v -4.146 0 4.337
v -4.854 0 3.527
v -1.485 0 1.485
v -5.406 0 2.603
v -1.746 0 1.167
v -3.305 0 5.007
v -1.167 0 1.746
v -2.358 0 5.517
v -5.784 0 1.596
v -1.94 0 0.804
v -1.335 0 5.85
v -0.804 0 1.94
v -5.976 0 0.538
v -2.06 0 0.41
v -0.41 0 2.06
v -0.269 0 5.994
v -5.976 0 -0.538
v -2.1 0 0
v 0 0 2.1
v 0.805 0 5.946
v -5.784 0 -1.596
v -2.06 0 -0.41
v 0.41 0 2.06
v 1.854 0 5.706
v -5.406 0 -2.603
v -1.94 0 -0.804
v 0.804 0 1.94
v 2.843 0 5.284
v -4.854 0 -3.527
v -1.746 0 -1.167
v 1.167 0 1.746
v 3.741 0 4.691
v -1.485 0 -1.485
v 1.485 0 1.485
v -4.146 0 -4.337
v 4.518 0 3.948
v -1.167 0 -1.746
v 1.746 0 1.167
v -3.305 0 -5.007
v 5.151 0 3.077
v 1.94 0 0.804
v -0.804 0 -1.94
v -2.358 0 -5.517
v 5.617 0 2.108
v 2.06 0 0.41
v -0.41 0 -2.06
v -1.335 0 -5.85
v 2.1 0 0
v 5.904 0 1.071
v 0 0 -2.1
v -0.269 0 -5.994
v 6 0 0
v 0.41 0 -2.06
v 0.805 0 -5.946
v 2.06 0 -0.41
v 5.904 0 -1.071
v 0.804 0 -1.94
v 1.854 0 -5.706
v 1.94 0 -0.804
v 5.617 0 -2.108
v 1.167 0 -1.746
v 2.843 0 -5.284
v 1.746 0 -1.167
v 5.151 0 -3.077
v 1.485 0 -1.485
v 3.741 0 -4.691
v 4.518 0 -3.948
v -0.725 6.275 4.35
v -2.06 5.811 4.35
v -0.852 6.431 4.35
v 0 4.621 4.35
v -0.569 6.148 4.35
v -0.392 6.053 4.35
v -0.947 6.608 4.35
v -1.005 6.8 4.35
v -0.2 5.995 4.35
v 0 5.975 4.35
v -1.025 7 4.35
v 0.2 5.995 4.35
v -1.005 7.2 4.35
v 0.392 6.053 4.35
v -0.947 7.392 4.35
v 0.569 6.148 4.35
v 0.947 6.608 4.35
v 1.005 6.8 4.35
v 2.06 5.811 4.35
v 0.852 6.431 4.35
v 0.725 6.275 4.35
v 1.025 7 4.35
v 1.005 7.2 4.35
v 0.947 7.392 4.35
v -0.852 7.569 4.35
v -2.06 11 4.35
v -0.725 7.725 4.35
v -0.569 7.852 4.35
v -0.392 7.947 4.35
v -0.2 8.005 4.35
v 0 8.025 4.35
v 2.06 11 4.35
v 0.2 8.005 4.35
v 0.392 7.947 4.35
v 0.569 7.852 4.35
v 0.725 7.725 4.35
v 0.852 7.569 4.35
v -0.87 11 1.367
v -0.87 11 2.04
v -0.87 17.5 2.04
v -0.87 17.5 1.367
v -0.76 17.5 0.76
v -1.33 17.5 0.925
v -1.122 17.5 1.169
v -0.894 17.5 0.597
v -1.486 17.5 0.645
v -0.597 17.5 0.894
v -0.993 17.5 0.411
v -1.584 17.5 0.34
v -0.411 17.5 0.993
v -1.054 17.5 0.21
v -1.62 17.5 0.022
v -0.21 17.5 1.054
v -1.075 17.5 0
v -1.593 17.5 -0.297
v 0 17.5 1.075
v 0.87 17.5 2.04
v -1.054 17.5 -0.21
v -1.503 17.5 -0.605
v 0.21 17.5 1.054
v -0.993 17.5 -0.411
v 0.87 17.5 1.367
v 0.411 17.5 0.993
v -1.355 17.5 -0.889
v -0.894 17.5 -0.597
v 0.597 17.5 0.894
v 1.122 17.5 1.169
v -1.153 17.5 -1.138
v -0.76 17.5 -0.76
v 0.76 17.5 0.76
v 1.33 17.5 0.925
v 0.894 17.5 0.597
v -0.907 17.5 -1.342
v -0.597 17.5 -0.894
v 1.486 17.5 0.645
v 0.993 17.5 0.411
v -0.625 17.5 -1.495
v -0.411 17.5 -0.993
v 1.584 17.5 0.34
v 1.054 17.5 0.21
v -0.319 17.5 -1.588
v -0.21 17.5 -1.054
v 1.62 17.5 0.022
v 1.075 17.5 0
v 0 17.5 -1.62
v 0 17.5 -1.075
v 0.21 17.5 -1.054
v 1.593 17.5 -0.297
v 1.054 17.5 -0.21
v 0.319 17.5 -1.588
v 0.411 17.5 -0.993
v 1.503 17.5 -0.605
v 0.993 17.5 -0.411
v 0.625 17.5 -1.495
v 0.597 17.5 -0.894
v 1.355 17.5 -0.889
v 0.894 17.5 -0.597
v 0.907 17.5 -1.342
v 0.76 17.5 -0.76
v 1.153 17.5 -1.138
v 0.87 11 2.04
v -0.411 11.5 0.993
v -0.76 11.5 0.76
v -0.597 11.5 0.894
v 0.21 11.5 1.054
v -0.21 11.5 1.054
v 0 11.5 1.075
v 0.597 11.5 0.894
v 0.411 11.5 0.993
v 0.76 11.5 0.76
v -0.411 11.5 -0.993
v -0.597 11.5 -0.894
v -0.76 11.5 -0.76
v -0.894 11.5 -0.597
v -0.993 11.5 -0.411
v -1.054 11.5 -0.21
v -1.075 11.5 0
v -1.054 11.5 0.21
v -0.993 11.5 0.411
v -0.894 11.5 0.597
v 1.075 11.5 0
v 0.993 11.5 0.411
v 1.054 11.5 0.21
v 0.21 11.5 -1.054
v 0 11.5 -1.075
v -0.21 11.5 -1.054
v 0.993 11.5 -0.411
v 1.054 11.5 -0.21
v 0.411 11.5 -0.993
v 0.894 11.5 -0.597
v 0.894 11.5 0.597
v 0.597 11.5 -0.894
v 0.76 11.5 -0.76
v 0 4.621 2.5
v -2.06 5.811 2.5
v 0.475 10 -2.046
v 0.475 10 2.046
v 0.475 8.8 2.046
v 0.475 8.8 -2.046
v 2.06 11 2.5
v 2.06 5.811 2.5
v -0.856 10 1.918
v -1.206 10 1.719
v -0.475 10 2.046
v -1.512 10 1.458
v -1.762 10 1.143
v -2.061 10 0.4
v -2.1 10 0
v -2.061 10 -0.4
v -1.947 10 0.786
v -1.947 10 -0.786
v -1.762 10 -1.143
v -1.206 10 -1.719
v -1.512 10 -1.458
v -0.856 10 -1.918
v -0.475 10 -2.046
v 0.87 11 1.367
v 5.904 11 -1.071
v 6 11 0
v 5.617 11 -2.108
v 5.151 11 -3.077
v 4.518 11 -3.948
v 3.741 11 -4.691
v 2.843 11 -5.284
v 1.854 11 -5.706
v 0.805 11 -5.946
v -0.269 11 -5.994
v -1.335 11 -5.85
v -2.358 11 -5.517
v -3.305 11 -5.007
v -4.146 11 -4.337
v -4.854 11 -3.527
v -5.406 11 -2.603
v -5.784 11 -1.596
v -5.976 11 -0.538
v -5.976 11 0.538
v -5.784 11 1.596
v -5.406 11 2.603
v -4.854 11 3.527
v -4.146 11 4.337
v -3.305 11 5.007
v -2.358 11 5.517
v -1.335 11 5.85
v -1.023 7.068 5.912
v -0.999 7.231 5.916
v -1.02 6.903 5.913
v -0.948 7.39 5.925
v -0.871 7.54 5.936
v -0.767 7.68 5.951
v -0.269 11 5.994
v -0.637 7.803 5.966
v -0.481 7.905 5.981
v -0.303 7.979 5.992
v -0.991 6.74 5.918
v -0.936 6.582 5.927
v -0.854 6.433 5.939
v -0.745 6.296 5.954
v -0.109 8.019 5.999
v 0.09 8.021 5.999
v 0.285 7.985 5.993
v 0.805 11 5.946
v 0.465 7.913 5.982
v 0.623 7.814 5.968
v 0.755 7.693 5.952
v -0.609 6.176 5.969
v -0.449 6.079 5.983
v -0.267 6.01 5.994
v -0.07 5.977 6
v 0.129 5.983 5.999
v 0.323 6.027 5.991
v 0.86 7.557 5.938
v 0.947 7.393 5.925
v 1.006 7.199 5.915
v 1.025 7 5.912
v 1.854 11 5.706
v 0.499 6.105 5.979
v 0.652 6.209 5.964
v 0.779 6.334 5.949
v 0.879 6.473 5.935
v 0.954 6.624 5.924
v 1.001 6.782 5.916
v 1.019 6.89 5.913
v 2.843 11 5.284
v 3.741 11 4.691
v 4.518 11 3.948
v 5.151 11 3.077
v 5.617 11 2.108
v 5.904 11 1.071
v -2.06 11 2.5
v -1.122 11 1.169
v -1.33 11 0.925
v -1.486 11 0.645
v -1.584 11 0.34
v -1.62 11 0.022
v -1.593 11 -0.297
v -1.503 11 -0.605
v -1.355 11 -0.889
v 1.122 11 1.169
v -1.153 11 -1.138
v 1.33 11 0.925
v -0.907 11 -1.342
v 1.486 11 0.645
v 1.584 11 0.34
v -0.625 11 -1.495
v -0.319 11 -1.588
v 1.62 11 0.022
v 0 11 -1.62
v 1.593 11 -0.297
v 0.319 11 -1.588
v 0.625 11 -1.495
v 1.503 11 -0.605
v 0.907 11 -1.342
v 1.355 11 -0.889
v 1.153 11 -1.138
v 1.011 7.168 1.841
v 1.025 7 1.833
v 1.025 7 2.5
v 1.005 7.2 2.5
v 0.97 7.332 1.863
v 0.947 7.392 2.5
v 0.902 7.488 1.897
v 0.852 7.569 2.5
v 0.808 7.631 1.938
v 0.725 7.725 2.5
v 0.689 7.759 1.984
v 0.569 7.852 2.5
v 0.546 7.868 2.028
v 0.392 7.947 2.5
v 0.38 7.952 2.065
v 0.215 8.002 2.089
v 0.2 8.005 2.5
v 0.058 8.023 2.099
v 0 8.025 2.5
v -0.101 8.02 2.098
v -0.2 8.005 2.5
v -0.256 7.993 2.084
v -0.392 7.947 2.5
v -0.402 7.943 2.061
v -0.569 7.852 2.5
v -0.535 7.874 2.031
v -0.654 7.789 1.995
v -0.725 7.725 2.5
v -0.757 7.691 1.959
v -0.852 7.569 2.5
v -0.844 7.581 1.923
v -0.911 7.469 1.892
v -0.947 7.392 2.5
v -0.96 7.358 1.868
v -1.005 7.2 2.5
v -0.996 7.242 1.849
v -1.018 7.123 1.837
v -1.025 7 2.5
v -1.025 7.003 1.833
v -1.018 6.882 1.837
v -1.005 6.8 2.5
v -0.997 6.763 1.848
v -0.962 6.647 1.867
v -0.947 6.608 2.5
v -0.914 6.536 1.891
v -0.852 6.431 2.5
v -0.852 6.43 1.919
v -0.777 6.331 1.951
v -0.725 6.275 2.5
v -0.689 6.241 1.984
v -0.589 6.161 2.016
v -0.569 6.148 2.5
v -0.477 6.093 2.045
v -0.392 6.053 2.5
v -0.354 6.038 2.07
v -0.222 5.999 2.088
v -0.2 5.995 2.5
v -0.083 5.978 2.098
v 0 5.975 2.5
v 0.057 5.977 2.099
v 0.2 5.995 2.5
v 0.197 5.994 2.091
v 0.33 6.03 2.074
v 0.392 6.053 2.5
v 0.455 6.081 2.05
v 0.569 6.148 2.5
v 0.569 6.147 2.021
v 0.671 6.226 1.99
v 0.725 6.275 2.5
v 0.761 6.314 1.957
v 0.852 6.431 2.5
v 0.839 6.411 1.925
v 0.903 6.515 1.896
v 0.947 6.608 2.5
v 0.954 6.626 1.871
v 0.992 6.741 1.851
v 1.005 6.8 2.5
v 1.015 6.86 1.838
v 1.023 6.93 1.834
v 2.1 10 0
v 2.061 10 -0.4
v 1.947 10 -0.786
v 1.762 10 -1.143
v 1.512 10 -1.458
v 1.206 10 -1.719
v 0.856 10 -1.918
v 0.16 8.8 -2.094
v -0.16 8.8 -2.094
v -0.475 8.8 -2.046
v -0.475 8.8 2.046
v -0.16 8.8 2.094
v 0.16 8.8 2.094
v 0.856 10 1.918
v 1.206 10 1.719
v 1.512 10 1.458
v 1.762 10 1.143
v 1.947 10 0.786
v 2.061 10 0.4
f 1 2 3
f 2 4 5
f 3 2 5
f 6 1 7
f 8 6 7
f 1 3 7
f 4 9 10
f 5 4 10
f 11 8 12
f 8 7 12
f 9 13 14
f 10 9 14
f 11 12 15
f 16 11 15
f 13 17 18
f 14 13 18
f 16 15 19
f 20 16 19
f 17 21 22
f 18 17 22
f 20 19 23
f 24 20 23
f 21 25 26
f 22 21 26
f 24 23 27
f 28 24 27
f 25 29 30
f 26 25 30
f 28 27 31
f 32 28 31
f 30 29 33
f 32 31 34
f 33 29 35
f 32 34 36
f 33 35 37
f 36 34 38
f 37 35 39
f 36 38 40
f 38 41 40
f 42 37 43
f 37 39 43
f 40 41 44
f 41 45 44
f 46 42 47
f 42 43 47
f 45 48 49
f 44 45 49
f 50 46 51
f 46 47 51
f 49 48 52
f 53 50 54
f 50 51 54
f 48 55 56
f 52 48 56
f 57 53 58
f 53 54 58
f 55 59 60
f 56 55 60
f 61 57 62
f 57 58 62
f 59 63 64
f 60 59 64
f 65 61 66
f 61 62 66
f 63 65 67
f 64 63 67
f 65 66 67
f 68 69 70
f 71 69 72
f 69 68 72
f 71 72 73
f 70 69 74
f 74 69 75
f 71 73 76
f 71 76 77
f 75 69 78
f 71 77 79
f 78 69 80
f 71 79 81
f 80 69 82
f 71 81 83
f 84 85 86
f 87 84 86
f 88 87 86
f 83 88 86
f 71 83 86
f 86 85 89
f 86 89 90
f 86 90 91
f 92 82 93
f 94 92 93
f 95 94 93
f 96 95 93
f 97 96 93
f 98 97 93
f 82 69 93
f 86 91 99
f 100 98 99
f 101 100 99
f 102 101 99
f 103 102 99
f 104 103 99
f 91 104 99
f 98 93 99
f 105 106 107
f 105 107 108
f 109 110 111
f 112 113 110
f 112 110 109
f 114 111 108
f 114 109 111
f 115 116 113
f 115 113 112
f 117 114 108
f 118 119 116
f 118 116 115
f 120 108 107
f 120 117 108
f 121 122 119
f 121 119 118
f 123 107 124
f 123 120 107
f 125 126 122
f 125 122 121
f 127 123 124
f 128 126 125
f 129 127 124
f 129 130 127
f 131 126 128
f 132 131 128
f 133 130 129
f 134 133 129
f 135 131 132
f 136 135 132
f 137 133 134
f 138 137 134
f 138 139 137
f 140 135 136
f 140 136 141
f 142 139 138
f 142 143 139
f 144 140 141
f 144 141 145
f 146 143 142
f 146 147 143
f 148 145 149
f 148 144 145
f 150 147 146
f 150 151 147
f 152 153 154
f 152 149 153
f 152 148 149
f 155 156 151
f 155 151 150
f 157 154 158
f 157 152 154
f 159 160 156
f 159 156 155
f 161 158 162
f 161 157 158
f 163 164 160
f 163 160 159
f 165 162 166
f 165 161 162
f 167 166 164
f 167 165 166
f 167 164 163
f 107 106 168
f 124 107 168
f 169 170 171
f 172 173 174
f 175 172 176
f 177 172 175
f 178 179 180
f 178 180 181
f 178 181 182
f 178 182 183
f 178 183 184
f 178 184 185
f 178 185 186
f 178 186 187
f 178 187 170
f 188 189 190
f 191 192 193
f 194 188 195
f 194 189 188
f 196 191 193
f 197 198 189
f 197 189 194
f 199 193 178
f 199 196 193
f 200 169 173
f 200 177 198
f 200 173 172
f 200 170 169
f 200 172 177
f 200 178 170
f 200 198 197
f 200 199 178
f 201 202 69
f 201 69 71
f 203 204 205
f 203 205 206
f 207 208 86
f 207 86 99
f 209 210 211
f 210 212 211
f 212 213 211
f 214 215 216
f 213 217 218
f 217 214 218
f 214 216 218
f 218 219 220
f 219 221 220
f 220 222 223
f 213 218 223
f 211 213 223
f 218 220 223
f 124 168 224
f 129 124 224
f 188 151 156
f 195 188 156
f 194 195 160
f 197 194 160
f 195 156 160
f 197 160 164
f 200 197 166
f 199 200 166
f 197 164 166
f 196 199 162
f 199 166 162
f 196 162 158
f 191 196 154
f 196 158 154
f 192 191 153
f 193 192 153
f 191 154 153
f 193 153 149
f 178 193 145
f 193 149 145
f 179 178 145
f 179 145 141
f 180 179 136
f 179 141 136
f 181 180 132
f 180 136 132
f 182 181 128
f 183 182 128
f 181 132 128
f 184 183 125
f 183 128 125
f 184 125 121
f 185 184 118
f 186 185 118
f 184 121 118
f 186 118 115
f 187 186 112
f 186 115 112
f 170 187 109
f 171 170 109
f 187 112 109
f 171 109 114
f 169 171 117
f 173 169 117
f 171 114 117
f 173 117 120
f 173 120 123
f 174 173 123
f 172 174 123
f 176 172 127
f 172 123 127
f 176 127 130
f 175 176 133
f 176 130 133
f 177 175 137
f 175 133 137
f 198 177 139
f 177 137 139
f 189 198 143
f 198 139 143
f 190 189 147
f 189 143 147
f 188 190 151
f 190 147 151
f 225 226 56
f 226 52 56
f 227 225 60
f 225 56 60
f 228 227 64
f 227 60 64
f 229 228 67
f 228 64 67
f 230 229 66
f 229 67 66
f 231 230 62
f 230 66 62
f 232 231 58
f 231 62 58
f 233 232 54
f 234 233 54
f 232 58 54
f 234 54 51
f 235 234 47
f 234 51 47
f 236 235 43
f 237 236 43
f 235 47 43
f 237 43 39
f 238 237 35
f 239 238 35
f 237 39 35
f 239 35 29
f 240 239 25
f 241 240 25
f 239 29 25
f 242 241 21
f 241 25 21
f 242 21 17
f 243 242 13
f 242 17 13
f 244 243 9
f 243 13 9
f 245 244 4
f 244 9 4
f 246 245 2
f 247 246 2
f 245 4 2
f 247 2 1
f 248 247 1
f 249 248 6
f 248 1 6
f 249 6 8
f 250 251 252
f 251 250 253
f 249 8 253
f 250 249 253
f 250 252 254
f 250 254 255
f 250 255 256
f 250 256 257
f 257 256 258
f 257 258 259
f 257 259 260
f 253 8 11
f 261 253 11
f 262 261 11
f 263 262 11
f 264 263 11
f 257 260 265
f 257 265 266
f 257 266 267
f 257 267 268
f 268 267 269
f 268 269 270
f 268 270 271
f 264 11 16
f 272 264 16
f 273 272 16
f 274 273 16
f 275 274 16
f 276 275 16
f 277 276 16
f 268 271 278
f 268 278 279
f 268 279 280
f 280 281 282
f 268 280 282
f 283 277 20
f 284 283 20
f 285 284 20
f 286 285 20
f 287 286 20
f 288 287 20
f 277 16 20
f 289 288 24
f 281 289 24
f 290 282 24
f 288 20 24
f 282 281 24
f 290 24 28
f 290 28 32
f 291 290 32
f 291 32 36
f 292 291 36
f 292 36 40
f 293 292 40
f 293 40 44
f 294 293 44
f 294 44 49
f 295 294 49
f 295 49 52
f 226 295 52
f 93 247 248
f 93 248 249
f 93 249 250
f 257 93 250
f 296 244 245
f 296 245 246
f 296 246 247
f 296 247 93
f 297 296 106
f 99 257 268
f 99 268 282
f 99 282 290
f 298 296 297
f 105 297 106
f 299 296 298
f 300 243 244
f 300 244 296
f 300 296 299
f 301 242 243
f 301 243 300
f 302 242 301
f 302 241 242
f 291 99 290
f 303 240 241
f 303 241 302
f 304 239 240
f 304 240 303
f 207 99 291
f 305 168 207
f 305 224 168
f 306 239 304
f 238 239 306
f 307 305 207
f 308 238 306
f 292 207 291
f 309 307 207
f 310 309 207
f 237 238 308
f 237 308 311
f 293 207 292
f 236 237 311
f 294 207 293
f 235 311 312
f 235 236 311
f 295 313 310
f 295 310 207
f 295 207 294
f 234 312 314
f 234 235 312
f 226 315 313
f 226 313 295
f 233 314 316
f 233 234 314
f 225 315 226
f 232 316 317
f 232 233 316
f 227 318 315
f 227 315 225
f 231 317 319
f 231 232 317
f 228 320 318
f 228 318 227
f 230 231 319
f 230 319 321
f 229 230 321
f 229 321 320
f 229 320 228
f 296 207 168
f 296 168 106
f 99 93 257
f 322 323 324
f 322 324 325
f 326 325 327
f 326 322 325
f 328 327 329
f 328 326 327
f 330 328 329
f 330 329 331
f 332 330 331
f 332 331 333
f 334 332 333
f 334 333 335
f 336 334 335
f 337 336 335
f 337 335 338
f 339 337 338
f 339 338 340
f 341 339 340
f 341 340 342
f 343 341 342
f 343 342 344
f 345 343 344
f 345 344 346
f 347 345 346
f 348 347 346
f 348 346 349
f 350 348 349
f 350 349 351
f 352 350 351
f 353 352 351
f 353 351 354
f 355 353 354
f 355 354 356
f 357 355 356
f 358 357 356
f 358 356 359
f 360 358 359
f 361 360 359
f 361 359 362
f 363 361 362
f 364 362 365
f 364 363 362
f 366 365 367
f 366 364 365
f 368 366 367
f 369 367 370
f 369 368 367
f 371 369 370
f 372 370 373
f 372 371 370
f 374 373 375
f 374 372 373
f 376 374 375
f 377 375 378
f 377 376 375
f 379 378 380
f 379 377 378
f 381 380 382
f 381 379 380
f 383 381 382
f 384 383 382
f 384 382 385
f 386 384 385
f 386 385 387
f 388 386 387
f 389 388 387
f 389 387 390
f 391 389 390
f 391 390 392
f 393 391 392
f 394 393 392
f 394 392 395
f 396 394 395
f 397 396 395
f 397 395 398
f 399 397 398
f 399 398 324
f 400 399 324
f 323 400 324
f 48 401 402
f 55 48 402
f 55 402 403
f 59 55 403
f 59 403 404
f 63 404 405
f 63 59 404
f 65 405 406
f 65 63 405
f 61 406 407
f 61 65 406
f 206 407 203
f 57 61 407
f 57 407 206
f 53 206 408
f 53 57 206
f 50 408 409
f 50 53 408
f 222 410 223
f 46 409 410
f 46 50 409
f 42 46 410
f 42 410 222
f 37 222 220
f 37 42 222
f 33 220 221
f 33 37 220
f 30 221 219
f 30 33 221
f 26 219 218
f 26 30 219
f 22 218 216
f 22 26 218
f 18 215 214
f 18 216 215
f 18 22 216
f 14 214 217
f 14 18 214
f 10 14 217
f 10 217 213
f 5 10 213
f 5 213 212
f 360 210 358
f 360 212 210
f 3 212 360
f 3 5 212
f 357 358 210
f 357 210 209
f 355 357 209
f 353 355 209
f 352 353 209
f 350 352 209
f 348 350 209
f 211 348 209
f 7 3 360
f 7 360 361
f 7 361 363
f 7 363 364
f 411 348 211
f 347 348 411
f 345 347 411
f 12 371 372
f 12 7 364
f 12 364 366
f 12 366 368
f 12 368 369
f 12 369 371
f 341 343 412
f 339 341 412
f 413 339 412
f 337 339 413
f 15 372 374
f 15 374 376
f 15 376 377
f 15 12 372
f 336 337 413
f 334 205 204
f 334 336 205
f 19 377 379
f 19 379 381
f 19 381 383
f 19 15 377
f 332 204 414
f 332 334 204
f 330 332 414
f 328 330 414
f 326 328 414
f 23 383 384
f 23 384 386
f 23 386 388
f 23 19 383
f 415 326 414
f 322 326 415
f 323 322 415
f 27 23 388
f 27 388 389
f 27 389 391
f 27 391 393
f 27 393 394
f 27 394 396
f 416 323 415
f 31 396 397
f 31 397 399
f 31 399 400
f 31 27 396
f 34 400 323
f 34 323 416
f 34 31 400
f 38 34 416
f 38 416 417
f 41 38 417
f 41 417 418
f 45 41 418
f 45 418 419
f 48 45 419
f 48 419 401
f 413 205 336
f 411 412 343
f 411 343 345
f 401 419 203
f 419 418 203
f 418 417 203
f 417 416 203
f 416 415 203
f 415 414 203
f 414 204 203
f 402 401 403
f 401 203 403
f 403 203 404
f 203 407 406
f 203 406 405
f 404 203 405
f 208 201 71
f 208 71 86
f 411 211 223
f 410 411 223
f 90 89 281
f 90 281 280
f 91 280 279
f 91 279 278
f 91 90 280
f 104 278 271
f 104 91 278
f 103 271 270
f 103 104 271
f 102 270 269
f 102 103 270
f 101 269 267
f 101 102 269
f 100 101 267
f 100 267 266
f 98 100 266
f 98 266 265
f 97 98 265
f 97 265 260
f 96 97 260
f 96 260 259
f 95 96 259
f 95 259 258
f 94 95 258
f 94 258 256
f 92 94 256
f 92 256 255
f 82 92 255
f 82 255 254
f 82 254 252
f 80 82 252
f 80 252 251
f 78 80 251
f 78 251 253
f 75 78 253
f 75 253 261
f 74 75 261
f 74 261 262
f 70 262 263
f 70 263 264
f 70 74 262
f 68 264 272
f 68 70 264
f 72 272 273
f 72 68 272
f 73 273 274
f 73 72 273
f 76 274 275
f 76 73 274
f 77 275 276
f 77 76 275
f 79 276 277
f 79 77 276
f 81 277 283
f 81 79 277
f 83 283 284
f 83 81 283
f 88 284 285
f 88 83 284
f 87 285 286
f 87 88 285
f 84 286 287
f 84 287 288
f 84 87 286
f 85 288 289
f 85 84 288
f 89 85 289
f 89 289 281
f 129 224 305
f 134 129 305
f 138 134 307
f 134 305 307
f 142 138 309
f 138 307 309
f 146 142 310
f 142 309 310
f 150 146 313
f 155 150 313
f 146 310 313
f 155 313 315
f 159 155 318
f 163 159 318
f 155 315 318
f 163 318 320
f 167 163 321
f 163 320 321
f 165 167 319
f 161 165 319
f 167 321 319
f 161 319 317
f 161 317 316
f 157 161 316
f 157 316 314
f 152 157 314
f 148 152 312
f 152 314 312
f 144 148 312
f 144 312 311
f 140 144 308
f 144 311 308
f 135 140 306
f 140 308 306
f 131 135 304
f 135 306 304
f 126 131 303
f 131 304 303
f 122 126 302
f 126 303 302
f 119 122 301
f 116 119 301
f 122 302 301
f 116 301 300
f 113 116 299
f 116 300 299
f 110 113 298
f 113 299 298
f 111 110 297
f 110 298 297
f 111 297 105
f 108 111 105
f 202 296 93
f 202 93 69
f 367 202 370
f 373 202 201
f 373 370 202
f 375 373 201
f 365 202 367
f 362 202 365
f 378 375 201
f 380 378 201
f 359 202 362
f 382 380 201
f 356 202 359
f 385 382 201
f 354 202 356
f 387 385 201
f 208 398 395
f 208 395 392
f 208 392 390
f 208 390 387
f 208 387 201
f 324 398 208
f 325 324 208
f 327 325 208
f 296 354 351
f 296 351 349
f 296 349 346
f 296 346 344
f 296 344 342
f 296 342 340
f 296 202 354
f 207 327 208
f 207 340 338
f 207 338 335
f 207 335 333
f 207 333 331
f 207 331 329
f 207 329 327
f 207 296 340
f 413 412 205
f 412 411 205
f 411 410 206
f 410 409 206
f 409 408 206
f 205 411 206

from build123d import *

# Parameters (mm, degrees)
SKETCH1_R           = 6
BOSS_EXTRUDE1_DEPTH = 10
SKETCH2_R           = 1.025
CUT_EXTRUDE1_DEPTH  = 7
SKETCH4_R           = 2.1
CUT_EXTRUDE4_DEPTH  = 11.0000001
SKETCH5_W           = 0.95
SKETCH5_H           = 7.069146706
BOSS_EXTRUDE2_DEPTH = 1.2
SKETCH7_R           = 6
BOSS_EXTRUDE3_DEPTH = 1
SKETCH8_R           = 1.62
SKETCH8_W           = 1.74
SKETCH8_H           = 0.84
BOSS_EXTRUDE4_DEPTH = 6.5
SKETCH9_R           = 1.075
CUT_EXTRUDE5_DEPTH  = 6
CUT_EXTRUDE2_START  = 2.5
CUT_EXTRUDE2_DEPTH  = 1.85


with BuildPart() as part:
    # Sketch1 → Boss-Extrude1 (new body)
    with BuildSketch(Plane(origin=(0, 0, 0), x_dir=(1, 0, 0), z_dir=(0, 1, 0))):
        Circle(SKETCH1_R)
    extrude(amount=BOSS_EXTRUDE1_DEPTH)

    # Sketch2 → Cut-Extrude1 (cut, through all)
    with BuildSketch(Plane.XY):
        with Locations((0, 7)):
            Circle(SKETCH2_R)
    extrude(amount=CUT_EXTRUDE1_DEPTH, mode=Mode.SUBTRACT)

    # Sketch4 → Cut-Extrude4 (cut, through all)
    with BuildSketch(Plane(origin=(0, 0, 0), x_dir=(1, 0, 0), z_dir=(0, 1, 0))):
        Circle(SKETCH4_R)
    extrude(amount=CUT_EXTRUDE4_DEPTH, mode=Mode.SUBTRACT)

    # Sketch5 → Boss-Extrude2 (add)
    with BuildSketch(Plane(origin=(0, 10, 0), x_dir=(1, 0, 0), z_dir=(0, 1, 0))):
        Rectangle(SKETCH5_W, SKETCH5_H)
    extrude(amount=-BOSS_EXTRUDE2_DEPTH)

    # Sketch7 → Boss-Extrude3 (add)
    with BuildSketch(Plane(origin=(0, 10, 0), x_dir=(1, 0, 0), z_dir=(0, 1, 0))):
        Circle(SKETCH7_R)
    extrude(amount=BOSS_EXTRUDE3_DEPTH)

    # Sketch8 → Boss-Extrude4 (add)
    with BuildSketch(Plane(origin=(0, 11, 0), x_dir=(1, 0, 0), z_dir=(0, 1, 0))):
        Circle(SKETCH8_R)
        with Locations((0, -1.62)):
            Rectangle(SKETCH8_W, SKETCH8_H)
    extrude(amount=BOSS_EXTRUDE4_DEPTH)

    # Sketch9 → Cut-Extrude5 (cut)
    with BuildSketch(Plane(origin=(0, 17.5, 0), x_dir=(1, 0, 0), z_dir=(0, 1, 0))):
        Circle(SKETCH9_R)
    extrude(amount=-CUT_EXTRUDE5_DEPTH, mode=Mode.SUBTRACT)

    # Sketch3 → Cut-Extrude2 (cut)
    with BuildSketch(Plane.XY.offset(CUT_EXTRUDE2_START)):
        Polygon((0, 4.621316891), (2.06, 5.810658445), (2.06, 8.189341555), (2.06, 11.363105915), (-2.06, 11.363105915), (-2.06, 8.189341555), (-2.06, 5.810658445), align=None)
    extrude(amount=CUT_EXTRUDE2_DEPTH, mode=Mode.SUBTRACT)


solid = part.part
